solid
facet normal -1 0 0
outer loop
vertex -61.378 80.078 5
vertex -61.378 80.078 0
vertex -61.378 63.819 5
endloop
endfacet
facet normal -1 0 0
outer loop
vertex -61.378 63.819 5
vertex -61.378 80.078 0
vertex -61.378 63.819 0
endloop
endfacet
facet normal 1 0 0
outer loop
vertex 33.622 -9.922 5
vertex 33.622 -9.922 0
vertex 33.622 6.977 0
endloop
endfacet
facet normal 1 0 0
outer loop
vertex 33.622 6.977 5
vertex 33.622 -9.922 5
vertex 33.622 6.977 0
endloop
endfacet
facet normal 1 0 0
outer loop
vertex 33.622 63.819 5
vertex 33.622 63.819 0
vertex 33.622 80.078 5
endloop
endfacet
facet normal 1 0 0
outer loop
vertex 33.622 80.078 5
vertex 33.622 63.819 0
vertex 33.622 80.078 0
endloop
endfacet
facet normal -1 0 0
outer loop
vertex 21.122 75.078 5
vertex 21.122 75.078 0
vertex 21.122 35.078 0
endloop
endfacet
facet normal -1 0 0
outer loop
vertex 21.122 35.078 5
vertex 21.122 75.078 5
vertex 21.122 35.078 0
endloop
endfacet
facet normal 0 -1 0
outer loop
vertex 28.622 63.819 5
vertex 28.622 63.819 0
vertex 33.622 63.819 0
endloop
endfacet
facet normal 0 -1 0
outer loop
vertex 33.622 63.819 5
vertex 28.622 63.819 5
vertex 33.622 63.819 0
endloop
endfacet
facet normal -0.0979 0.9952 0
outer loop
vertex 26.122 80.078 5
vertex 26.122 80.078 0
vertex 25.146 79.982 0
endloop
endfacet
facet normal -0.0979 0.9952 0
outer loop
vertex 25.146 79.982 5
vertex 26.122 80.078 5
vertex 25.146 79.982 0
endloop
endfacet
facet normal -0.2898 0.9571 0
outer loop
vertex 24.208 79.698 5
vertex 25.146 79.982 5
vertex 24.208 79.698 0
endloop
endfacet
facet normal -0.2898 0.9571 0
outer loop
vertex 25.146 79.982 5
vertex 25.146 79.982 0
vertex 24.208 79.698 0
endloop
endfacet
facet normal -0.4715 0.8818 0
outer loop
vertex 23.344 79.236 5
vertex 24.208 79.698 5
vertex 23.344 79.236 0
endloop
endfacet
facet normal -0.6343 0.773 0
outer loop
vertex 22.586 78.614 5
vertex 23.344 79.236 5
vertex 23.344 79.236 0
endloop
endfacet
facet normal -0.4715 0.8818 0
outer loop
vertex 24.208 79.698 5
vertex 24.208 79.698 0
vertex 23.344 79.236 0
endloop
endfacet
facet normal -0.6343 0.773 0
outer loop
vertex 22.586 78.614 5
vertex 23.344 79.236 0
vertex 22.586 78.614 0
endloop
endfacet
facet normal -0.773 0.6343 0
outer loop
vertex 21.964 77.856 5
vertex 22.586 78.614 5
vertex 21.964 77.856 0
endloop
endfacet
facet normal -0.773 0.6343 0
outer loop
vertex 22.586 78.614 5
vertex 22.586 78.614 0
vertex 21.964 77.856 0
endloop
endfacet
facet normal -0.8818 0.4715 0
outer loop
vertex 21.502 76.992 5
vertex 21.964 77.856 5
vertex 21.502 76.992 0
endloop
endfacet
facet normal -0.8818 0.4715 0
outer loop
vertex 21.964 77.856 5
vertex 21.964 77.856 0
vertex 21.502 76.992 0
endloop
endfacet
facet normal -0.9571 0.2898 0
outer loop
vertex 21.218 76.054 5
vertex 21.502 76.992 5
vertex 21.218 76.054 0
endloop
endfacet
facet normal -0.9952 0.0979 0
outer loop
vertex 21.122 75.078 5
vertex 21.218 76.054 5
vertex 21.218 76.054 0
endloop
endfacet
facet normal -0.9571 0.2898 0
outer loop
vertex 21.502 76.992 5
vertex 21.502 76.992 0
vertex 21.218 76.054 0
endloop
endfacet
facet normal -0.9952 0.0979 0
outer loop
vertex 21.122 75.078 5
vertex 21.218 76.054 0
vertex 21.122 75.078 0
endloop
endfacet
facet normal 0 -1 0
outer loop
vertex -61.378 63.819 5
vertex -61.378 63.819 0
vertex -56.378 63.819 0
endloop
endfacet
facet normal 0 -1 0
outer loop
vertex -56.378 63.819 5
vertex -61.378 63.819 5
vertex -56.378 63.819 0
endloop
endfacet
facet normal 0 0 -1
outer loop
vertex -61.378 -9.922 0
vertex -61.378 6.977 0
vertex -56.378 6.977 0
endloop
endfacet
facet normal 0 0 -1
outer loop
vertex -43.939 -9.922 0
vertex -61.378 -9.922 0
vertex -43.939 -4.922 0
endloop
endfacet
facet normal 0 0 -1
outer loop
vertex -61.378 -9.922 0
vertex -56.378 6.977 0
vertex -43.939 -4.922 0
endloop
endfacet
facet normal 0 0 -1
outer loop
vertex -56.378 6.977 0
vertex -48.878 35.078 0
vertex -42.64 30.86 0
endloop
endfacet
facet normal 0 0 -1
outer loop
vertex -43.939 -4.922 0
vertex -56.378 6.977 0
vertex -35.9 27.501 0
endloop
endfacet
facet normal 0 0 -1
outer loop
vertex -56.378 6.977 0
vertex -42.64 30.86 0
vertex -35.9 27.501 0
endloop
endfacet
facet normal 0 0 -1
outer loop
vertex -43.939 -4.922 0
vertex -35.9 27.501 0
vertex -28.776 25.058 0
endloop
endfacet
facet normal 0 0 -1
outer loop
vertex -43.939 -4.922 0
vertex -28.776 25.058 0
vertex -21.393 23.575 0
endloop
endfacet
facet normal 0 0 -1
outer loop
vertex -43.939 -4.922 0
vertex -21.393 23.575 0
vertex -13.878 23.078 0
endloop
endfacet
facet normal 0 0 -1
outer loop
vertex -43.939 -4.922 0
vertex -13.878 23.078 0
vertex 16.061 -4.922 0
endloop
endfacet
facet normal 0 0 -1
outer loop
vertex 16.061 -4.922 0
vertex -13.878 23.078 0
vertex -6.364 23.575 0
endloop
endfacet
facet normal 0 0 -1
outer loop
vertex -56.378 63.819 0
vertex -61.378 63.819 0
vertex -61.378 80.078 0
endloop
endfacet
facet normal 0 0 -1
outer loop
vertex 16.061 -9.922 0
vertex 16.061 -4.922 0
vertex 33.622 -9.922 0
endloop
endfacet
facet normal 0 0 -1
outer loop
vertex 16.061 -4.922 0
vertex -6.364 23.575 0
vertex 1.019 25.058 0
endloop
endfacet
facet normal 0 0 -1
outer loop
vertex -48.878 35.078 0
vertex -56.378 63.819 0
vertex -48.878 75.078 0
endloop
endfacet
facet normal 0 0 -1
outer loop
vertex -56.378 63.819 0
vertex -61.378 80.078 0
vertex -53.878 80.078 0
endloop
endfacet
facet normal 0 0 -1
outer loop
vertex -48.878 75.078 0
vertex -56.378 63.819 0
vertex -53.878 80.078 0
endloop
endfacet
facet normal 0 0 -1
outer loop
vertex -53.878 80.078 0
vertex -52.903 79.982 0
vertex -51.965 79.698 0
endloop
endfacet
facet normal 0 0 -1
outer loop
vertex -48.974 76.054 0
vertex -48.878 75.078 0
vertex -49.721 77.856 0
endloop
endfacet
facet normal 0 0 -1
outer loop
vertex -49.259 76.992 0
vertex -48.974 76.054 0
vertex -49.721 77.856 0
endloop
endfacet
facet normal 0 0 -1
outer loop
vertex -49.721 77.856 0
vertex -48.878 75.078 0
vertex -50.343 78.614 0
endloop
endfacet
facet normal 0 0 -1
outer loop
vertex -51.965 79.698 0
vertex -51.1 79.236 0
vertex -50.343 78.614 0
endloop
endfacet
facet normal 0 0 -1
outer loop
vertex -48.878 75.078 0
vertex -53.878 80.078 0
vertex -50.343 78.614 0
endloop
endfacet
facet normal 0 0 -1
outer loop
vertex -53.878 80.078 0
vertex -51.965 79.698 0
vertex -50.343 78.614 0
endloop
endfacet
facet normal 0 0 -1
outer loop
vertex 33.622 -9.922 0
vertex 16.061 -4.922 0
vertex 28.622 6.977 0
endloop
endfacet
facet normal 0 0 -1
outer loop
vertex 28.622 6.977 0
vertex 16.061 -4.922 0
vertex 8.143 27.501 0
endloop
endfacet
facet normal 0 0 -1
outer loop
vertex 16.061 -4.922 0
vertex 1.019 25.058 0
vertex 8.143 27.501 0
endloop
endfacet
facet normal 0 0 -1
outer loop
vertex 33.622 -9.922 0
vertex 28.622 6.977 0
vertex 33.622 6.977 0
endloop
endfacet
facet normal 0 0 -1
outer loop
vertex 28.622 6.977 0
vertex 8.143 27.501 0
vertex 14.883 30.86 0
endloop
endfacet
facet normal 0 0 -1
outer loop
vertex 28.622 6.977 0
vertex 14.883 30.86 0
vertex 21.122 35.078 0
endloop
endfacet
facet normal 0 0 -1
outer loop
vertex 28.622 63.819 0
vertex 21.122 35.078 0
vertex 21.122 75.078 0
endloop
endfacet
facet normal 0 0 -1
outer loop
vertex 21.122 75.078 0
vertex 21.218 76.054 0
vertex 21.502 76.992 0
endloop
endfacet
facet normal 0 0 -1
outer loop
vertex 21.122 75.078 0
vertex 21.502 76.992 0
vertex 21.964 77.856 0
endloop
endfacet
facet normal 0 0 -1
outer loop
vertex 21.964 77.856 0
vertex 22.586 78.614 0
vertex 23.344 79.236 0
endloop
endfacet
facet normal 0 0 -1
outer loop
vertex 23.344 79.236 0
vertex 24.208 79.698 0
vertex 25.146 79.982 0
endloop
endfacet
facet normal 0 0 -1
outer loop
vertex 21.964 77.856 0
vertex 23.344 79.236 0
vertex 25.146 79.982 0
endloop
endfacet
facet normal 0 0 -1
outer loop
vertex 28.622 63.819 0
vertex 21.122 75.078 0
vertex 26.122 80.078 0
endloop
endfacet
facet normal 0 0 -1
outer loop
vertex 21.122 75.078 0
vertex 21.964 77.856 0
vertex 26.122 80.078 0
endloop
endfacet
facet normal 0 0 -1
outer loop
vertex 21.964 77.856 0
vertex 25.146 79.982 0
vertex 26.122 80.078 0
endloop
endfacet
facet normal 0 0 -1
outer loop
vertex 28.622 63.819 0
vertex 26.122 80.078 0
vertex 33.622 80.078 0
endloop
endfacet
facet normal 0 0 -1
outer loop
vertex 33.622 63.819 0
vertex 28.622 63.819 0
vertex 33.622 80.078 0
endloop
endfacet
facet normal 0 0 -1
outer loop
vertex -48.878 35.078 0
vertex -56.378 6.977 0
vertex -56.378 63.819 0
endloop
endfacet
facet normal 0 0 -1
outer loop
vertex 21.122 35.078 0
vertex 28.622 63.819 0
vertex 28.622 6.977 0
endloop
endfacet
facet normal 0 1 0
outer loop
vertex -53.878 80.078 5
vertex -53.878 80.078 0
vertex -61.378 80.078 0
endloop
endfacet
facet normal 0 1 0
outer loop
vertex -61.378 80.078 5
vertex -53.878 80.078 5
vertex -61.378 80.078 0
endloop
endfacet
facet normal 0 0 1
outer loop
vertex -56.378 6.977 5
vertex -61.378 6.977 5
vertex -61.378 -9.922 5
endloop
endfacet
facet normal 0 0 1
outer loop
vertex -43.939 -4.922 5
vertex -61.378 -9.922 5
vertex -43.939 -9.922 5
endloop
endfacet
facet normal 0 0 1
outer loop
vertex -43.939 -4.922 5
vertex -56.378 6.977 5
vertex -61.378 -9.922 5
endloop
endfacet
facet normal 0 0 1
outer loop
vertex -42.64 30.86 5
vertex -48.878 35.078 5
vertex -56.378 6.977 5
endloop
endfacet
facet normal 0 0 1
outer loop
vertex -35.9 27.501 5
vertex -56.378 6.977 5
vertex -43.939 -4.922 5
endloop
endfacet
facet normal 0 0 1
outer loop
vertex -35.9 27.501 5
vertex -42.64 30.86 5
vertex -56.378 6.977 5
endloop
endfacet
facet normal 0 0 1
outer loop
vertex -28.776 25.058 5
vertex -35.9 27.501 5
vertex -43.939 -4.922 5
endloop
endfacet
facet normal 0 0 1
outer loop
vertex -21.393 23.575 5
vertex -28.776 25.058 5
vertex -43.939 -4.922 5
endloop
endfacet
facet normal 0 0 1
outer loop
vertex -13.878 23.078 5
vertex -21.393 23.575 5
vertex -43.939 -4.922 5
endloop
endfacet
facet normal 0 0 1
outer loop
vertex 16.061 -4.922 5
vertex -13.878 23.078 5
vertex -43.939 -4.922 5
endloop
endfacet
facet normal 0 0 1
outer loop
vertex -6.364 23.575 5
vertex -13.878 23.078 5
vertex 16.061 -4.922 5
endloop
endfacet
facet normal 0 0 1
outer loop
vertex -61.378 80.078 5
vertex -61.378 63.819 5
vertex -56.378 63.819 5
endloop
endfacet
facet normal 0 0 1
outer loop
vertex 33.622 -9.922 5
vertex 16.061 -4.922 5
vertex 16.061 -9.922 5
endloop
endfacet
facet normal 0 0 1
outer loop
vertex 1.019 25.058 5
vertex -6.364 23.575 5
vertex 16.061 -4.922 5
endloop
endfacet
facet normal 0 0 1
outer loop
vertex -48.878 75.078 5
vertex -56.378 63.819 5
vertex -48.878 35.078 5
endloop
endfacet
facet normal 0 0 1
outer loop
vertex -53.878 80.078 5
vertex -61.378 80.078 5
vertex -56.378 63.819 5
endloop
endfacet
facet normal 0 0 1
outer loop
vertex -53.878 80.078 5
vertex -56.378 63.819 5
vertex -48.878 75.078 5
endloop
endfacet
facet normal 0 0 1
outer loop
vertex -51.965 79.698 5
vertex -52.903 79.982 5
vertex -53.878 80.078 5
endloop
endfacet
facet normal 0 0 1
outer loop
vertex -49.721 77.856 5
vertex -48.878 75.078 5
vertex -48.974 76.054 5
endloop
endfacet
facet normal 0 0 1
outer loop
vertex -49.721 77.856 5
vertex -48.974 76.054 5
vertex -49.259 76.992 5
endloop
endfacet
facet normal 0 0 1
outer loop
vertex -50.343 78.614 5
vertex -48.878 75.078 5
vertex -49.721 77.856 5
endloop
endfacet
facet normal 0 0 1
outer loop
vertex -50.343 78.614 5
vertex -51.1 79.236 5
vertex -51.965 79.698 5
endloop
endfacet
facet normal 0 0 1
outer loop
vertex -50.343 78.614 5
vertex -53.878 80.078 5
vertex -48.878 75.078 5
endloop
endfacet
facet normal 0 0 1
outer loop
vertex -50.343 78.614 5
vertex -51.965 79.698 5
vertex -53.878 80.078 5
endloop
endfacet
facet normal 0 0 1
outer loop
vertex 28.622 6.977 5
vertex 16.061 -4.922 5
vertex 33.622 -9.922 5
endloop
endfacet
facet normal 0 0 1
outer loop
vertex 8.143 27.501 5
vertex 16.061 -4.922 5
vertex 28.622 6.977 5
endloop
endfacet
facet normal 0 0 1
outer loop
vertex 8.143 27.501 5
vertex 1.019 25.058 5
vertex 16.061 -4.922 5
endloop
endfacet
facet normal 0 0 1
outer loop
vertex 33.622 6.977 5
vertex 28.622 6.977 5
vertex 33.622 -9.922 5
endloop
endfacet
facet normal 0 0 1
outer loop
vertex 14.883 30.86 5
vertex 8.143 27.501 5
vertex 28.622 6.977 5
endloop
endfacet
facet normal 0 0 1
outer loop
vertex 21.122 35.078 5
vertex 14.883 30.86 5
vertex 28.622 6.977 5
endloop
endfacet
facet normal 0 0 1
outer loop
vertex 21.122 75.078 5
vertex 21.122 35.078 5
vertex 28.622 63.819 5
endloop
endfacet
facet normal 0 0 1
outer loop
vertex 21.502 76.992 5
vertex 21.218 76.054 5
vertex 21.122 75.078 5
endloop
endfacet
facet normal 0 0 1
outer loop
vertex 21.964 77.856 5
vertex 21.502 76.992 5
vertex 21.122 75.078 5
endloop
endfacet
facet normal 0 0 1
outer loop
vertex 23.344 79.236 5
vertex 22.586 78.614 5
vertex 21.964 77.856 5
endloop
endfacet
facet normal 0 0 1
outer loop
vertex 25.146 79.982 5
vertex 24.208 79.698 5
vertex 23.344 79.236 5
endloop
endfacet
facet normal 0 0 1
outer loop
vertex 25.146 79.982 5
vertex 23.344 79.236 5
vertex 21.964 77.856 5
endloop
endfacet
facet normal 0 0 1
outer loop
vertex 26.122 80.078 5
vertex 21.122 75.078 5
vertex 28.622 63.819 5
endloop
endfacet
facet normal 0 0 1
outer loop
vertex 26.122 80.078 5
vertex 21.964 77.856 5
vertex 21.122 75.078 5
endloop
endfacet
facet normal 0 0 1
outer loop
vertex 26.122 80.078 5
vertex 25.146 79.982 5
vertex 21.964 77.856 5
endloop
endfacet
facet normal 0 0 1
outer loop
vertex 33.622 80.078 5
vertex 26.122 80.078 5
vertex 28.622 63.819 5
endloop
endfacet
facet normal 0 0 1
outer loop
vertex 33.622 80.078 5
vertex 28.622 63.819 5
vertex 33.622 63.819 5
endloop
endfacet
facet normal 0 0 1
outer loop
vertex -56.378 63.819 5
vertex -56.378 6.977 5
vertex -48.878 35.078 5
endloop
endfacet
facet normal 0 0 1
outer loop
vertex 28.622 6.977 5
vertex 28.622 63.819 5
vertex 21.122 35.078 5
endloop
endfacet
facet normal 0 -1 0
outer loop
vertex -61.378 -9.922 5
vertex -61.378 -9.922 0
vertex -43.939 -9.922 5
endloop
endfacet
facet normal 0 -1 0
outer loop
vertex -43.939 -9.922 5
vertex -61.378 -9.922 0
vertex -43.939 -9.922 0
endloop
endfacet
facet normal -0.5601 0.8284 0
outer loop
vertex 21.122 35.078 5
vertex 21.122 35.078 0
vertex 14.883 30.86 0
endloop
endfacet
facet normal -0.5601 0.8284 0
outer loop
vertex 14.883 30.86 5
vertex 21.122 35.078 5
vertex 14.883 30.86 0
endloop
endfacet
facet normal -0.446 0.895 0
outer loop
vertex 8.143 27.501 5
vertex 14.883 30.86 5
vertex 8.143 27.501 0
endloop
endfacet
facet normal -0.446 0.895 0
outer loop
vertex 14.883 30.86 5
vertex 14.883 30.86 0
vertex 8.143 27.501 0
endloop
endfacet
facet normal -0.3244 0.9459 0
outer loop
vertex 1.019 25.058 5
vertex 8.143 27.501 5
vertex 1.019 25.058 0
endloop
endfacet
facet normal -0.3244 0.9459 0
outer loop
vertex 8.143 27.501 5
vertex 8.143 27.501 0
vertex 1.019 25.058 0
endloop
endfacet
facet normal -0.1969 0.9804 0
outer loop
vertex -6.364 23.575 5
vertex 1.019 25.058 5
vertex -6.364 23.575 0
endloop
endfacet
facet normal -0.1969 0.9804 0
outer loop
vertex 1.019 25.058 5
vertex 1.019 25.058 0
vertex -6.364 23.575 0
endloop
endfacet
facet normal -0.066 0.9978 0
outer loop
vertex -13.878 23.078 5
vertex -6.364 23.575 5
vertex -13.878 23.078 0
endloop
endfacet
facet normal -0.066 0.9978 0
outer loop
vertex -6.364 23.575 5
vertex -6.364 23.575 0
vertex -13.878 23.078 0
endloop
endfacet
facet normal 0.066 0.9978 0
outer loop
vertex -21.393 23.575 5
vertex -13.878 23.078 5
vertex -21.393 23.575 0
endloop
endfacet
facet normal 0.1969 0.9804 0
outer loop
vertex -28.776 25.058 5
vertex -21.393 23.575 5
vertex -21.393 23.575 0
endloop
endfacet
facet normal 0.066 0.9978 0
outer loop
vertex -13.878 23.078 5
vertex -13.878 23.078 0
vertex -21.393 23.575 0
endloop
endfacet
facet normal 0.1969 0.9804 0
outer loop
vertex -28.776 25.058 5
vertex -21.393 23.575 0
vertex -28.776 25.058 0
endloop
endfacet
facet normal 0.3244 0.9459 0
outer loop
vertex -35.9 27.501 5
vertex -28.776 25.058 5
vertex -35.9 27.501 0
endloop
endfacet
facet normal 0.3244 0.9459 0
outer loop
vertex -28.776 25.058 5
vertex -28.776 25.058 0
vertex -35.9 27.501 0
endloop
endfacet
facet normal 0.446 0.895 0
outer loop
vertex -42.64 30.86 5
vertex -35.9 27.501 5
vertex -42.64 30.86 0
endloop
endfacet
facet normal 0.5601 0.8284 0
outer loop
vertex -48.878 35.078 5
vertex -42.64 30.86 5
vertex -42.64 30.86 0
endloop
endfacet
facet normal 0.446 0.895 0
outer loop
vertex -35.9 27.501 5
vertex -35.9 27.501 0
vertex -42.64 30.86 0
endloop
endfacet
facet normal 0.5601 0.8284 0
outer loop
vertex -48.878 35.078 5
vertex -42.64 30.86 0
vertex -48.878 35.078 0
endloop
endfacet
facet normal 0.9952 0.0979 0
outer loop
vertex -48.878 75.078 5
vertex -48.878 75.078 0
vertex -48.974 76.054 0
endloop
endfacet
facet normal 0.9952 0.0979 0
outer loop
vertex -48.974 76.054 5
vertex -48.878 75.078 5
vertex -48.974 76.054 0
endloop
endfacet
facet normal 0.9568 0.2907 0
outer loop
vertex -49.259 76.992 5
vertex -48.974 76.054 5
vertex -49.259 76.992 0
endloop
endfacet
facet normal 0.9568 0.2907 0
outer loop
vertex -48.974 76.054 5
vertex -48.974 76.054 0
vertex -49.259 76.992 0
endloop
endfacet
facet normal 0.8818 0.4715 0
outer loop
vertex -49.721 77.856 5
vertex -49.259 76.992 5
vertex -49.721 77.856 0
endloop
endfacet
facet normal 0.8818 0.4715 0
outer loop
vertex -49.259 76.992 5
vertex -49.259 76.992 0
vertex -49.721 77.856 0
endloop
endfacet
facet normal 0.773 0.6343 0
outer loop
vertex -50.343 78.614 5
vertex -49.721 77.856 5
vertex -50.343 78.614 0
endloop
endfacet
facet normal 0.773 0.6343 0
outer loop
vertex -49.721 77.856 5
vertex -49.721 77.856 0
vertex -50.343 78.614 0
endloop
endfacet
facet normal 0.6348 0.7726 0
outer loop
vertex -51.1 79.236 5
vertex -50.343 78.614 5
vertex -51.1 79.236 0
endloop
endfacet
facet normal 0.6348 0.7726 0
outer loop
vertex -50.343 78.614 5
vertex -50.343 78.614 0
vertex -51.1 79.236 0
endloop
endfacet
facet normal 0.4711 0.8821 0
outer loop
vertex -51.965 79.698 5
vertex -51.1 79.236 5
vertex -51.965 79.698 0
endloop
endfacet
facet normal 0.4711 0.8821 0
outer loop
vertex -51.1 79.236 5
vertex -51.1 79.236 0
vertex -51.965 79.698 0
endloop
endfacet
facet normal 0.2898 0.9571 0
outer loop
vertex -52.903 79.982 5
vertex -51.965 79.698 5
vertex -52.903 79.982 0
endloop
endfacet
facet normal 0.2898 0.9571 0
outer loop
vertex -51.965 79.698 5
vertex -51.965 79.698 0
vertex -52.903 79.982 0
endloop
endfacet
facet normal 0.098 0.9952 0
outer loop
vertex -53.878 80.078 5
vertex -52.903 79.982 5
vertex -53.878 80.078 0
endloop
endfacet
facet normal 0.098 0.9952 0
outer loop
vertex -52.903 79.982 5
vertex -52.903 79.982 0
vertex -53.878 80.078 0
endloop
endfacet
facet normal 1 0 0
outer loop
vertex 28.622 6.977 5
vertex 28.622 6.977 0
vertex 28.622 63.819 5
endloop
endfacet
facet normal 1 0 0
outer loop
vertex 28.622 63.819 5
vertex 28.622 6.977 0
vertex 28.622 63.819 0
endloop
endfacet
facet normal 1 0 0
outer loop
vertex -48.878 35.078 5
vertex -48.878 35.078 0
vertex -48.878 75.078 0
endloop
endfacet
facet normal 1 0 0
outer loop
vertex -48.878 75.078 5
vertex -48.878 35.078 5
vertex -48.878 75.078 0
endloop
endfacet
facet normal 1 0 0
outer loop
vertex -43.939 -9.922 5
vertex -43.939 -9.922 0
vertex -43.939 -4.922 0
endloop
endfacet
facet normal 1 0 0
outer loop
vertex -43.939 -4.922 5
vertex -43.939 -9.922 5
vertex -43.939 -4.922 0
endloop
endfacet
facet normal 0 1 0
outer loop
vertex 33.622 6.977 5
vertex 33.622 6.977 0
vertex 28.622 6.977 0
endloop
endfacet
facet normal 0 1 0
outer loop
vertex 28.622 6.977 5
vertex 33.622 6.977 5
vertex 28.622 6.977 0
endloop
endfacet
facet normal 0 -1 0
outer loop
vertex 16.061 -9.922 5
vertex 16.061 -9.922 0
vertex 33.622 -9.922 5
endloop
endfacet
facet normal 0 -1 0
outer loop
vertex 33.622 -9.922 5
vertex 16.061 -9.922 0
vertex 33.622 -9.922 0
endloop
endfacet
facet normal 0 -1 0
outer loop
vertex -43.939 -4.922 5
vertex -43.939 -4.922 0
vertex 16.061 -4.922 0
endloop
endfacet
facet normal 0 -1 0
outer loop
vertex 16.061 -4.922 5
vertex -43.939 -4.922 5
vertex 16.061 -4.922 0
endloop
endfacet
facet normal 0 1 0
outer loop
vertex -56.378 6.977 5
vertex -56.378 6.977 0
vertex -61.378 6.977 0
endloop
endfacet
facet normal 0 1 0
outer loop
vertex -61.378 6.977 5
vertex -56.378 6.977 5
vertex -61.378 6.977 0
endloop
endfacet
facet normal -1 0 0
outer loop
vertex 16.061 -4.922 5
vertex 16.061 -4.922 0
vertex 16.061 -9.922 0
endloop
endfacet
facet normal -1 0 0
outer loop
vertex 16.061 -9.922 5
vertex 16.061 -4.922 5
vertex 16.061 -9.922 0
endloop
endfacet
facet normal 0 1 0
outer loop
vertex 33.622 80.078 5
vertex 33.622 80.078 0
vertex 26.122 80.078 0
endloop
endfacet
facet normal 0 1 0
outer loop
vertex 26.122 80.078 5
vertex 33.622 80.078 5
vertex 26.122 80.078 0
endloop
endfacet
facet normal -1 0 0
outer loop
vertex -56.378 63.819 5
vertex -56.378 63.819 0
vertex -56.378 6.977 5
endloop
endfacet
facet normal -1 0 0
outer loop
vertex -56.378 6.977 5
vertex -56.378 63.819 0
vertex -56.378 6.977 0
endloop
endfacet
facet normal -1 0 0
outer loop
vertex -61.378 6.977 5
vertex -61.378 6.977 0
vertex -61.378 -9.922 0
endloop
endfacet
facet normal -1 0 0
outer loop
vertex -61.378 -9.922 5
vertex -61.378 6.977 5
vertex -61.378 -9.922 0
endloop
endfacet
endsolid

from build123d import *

# Parameters (mm, degrees)
AUFSATZ_LINEAR_AUSTRAGEN1_DEPTH = 5


with BuildPart() as part:
    # Skizze1 → Aufsatz-Linear austragen1 (new body)
    with BuildSketch(Plane.XY):
        with BuildLine():
            Line((-61.378328771, 63.819239112), (-56.378328771, 63.819239112))
            Line((-56.378328771, 63.819239112), (-56.378328771, 6.977133849))
            Line((-56.378328771, 6.977133849), (-61.378328771, 6.977133849))
            Line((-61.378328771, 6.977133849), (-61.378328771, -9.921658625))
            Line((-61.378328771, -9.921658625), (-43.939454059, -9.921658625))
            Line((-43.939454059, -9.921658625), (-43.939454059, -4.921658625))
            Line((-43.939454059, -4.921658625), (16.060545941, -4.921658625))
            Line((16.060545941, -4.921658625), (16.060545941, -9.921658625))
            Line((16.060545941, -9.921658625), (33.621671229, -9.921658625))
            Line((33.621671229, -9.921658625), (33.621671229, 6.977133849))
            Line((33.621671229, 6.977133849), (28.621671229, 6.977133849))
            Line((28.621671229, 6.977133849), (28.621671229, 63.819239112))
            Line((28.621671229, 63.819239112), (33.621671229, 63.819239112))
            Line((33.621671229, 63.819239112), (33.621671229, 80.078341375))
            Line((33.621671229, 80.078341375), (26.121671229, 80.078341375))
            ThreePointArc((26.121671229, 80.078341375), (22.586137323, 78.613875281), (21.121671229, 75.078341375))
            Line((21.121671229, 75.078341375), (21.121671229, 35.078341375))
            ThreePointArc((21.121671229, 35.078341375), (-13.878328771, 23.078341375), (-48.878328771, 35.078341375))
            Line((-48.878328771, 35.078341375), (-48.878328771, 75.078341375))
            ThreePointArc((-48.878328771, 75.078341375), (-50.342794866, 78.613875281), (-53.878328771, 80.078341375))
            Line((-53.878328771, 80.078341375), (-61.378328771, 80.078341375))
            Line((-61.378328771, 80.078341375), (-61.378328771, 63.819239112))
        make_face()
    extrude(amount=AUFSATZ_LINEAR_AUSTRAGEN1_DEPTH)


solid = part.part
